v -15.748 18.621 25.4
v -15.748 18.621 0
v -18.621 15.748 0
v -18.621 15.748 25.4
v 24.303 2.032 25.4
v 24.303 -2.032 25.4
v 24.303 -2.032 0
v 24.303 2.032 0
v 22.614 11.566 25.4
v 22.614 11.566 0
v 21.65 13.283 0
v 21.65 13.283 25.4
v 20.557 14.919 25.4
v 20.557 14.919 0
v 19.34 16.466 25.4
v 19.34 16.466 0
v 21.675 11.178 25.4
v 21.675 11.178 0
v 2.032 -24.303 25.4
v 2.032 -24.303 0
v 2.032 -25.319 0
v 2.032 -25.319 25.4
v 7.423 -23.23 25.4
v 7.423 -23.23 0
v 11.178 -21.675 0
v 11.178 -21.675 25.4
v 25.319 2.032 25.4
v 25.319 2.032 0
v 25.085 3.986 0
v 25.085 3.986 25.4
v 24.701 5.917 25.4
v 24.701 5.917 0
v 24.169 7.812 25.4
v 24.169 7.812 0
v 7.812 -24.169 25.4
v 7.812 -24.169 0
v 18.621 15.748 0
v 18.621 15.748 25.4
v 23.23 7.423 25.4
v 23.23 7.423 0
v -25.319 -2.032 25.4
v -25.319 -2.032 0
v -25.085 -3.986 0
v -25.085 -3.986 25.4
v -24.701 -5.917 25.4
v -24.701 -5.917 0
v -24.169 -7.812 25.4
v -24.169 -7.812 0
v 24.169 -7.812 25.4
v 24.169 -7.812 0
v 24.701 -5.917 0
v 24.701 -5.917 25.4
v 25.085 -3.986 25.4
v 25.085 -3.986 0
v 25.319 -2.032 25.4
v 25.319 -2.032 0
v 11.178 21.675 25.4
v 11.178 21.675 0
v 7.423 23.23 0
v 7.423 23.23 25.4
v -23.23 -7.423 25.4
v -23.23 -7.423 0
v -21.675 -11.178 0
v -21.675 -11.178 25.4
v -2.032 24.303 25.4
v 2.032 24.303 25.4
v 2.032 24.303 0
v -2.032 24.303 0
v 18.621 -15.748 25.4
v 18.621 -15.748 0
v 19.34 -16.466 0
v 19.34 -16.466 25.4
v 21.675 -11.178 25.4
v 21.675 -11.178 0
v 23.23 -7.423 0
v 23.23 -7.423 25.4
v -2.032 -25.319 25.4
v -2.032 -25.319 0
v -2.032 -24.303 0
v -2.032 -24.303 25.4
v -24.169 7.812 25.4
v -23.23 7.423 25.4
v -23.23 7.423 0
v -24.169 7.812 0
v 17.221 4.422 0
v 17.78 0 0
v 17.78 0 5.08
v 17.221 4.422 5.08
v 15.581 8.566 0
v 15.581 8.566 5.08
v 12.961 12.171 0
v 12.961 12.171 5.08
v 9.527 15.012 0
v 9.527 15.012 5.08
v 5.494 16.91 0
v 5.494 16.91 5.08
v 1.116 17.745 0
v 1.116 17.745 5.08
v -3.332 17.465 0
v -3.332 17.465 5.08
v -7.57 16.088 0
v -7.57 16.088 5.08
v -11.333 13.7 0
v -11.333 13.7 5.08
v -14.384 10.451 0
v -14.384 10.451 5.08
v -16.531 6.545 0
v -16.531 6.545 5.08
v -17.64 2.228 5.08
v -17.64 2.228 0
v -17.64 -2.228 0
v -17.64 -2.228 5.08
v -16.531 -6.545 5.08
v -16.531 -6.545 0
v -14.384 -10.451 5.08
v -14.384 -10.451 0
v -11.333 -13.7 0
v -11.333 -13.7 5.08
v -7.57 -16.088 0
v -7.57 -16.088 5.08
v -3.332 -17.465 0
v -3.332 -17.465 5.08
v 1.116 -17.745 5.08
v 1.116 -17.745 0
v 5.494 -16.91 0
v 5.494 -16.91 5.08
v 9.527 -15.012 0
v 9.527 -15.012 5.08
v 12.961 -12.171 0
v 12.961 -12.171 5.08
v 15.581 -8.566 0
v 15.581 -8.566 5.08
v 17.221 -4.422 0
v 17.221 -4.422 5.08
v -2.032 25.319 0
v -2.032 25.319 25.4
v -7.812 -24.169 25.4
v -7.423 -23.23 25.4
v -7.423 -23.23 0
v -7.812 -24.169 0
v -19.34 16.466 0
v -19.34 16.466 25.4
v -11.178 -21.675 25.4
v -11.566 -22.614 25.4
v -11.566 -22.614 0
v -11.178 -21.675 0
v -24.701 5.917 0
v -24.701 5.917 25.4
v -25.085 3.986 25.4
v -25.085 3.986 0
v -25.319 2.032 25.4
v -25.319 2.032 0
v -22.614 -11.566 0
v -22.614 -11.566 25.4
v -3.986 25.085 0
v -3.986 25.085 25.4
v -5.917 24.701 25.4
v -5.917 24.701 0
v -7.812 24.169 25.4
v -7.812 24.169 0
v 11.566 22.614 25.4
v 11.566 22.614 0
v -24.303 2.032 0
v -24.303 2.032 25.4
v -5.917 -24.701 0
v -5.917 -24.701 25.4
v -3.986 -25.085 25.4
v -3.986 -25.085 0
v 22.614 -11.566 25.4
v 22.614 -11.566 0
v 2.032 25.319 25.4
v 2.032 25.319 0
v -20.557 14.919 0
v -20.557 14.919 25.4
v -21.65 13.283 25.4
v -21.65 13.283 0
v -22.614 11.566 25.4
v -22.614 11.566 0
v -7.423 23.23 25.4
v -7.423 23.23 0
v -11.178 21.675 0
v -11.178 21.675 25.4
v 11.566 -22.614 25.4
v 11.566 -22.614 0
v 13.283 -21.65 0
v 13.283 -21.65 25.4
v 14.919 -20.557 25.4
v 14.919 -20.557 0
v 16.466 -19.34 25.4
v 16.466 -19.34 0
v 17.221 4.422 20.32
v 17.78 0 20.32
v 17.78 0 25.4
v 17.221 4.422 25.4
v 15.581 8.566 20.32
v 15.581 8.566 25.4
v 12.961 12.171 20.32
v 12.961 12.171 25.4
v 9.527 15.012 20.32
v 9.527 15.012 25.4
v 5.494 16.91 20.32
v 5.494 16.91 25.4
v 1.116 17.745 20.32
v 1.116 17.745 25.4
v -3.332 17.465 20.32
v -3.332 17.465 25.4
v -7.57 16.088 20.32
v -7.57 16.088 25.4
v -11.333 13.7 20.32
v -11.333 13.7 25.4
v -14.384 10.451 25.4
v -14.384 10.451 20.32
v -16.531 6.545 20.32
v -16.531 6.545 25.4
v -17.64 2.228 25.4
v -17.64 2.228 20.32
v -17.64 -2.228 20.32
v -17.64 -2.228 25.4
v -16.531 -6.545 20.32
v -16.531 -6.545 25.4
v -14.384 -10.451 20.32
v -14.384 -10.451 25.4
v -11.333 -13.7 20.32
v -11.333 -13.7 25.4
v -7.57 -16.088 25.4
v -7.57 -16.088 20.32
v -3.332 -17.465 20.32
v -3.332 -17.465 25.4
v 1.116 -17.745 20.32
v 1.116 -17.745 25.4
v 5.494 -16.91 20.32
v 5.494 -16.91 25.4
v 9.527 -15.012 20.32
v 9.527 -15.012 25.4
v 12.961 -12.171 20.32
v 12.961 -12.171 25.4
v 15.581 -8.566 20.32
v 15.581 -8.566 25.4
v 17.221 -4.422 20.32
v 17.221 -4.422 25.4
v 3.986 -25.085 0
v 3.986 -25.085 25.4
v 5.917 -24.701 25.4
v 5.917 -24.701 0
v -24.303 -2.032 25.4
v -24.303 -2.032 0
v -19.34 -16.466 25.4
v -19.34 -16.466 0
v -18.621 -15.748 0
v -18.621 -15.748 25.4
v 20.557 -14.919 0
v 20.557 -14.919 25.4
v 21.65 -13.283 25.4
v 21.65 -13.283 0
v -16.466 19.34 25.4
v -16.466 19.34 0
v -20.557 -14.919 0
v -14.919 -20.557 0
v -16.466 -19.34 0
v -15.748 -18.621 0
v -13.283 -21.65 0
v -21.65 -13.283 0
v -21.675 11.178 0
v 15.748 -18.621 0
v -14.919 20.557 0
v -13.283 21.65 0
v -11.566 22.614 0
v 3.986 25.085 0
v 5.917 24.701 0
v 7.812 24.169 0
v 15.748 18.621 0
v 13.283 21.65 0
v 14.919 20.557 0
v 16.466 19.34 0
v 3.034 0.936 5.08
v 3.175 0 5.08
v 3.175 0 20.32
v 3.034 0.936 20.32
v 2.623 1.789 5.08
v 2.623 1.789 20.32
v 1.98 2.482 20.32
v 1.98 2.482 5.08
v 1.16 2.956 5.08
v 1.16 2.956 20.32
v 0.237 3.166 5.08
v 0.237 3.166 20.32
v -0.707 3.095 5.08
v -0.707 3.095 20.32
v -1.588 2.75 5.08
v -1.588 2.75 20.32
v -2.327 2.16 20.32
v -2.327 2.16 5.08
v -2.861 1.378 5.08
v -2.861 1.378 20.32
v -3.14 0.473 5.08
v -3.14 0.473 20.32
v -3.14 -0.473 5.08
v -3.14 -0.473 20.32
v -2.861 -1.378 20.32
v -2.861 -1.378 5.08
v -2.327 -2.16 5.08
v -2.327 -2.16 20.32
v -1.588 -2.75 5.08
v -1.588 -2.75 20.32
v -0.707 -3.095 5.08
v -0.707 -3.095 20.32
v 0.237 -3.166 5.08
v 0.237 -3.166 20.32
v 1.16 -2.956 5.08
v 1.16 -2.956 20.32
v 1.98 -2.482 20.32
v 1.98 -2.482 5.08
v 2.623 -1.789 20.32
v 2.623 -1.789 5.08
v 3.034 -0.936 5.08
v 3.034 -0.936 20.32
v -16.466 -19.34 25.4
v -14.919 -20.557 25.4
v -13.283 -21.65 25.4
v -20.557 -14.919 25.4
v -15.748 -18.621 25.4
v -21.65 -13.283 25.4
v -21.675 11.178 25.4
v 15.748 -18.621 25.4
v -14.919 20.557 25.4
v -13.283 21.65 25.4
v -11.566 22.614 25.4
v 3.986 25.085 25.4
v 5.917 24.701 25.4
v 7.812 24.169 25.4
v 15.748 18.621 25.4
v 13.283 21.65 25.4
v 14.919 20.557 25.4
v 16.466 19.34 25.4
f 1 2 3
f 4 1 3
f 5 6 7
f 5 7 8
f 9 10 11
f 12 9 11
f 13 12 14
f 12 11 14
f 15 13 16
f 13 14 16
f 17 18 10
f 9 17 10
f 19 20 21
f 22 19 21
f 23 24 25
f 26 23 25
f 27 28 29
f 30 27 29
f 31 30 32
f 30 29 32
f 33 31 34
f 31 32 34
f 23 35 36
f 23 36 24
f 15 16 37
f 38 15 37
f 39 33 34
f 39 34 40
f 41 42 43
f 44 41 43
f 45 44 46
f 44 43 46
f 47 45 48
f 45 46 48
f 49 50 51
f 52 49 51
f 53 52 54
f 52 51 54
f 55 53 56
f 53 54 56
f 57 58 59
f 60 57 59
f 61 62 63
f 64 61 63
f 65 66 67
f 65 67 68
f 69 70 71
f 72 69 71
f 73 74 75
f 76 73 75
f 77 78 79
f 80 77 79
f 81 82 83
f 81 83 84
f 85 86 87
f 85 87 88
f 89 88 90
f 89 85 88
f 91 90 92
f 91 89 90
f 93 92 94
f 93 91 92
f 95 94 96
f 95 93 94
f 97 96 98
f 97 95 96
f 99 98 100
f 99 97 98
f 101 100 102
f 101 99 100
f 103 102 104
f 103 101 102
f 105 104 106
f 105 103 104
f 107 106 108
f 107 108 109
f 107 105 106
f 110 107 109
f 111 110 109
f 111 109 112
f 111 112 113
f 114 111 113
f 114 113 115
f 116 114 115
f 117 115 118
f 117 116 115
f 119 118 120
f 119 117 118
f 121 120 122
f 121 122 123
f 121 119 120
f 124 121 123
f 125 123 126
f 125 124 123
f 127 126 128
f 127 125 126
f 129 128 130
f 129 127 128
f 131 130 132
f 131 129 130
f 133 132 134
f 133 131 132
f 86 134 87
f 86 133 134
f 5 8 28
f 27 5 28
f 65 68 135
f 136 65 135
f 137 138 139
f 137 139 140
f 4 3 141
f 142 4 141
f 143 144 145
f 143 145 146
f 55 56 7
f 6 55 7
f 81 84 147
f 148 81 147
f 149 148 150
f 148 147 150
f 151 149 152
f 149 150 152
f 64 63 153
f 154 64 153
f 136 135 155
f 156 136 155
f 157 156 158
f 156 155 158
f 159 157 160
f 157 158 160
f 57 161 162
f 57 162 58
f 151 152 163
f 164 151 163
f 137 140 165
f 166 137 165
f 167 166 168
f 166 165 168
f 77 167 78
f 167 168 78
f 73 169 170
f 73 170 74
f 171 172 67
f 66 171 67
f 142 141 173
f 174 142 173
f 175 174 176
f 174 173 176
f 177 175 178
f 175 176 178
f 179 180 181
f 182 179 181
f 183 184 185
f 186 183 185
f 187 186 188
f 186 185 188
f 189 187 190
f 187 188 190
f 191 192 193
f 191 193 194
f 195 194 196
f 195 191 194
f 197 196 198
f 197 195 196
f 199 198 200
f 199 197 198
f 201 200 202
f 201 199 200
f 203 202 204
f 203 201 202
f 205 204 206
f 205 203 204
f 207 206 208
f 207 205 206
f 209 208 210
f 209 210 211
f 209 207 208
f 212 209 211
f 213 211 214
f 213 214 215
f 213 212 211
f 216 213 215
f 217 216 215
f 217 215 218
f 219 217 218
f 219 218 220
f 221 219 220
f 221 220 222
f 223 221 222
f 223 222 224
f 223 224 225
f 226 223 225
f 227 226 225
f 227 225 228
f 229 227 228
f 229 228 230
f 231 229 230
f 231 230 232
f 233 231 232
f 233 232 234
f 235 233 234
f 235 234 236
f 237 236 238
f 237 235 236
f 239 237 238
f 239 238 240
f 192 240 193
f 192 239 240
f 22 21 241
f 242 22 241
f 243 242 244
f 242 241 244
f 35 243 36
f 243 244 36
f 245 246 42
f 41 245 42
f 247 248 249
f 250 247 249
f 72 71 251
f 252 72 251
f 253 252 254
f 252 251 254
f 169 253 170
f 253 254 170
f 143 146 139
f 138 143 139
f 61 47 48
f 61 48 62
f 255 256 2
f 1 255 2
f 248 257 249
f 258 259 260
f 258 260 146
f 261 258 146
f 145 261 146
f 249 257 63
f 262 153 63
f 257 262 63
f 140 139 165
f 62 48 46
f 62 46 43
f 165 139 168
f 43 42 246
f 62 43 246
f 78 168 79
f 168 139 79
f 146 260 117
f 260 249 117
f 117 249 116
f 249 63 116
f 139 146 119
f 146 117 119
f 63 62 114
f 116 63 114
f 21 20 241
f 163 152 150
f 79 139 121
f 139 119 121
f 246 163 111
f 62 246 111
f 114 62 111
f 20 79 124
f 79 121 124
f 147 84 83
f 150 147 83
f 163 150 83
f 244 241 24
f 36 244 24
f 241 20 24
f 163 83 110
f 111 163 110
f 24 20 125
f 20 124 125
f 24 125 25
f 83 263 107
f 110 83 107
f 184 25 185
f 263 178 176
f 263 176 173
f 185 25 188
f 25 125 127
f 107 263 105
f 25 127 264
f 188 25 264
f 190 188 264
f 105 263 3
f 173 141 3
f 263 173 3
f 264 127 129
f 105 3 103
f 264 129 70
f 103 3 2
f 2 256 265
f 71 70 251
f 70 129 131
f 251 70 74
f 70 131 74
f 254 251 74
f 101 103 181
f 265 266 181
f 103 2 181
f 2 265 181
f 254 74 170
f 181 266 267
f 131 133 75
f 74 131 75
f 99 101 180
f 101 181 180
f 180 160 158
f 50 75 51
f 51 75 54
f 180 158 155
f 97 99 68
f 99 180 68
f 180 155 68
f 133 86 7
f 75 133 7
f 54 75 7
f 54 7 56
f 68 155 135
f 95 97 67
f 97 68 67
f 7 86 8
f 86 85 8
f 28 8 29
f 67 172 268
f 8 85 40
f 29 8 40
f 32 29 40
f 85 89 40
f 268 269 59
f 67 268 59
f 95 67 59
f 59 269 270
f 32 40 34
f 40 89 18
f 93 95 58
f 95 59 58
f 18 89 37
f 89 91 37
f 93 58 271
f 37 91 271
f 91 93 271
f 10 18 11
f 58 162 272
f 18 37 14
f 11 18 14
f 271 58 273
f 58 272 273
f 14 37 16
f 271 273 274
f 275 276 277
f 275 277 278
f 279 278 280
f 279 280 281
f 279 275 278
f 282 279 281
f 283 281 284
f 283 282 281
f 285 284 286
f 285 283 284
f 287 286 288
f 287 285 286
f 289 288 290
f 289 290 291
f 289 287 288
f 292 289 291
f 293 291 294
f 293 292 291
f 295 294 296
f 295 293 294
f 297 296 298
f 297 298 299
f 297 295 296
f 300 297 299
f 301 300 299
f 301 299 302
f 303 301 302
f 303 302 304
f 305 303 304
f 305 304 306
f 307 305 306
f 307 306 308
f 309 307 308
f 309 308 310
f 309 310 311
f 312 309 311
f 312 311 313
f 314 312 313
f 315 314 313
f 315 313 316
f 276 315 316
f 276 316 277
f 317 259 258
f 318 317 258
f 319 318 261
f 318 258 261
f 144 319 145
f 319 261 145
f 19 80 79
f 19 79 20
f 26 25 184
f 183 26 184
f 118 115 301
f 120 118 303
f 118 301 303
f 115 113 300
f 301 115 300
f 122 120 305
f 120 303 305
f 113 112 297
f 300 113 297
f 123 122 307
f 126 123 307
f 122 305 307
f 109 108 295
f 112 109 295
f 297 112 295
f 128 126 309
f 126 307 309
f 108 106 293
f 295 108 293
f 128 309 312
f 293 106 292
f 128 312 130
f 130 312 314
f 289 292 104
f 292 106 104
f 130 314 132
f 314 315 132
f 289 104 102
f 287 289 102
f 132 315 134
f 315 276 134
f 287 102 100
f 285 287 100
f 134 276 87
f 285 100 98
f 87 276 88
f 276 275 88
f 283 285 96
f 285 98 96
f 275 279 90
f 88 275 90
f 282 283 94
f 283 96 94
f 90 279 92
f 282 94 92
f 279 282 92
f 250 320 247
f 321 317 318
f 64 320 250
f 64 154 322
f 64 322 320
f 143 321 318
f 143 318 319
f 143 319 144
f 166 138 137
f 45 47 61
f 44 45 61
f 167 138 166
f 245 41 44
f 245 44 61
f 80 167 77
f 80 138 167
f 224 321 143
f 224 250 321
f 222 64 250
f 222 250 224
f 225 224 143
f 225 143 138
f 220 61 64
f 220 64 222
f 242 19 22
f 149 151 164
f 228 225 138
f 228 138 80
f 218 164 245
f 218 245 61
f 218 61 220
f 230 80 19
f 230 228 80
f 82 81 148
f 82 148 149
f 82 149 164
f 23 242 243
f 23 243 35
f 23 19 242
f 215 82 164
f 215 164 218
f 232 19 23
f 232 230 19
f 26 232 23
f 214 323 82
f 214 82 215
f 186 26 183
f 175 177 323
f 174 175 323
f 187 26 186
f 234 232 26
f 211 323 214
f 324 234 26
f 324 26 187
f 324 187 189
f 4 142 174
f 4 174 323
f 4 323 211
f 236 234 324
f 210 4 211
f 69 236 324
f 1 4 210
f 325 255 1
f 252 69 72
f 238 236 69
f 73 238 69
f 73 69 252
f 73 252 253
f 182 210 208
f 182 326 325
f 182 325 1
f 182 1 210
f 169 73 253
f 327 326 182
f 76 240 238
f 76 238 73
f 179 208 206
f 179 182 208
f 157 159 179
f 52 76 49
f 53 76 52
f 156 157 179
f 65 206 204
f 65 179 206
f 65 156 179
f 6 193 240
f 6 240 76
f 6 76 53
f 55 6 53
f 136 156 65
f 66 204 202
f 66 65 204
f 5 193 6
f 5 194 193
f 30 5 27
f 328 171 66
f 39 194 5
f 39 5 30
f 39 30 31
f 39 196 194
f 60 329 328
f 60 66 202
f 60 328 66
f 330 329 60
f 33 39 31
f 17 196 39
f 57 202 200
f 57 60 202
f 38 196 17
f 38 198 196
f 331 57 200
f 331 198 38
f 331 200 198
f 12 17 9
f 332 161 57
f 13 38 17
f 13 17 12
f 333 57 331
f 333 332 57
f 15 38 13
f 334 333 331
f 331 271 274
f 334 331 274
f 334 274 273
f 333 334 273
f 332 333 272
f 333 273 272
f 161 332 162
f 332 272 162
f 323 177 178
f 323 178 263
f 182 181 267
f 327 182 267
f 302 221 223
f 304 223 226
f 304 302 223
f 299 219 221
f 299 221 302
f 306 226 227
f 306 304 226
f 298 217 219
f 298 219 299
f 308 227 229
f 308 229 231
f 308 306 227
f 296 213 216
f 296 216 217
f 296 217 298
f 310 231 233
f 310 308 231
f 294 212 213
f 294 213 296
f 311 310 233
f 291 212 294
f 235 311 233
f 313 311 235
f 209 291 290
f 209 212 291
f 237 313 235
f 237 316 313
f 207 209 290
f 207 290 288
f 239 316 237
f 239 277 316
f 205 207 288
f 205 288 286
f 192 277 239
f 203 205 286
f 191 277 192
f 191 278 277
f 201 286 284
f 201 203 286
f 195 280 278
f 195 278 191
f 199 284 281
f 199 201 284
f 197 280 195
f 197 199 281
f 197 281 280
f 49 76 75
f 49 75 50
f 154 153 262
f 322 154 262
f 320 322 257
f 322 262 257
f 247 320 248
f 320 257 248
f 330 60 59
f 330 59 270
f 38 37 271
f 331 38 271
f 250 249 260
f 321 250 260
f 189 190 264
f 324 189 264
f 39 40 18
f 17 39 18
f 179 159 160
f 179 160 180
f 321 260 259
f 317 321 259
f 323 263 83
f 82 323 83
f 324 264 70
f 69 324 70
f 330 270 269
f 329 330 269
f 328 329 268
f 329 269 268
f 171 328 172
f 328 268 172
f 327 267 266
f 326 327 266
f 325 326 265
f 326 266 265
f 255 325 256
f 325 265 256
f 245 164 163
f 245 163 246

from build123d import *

# Parameters (mm, degrees)
SKETCH1_R           = 17.78
BOSS_EXTRUDE2_DEPTH = 25.4
SKETCH1_3_R         = 17.78
SKETCH1_3_R_2       = 3.175
BOSS_EXTRUDE3_DEPTH = 20.32
SKETCH1_4_R         = 17.78
SKETCH1_4_R_2       = 3.175
CUT_EXTRUDE1_DEPTH  = 5.08


with BuildPart() as part:
    # Sketch1 → Boss-Extrude2 (new body)
    with BuildSketch(Plane.XY):
        with BuildLine():
            Line((11.566327956, 22.613713928), (11.177521588, 21.675052323))
            Line((11.177521588, 21.675052323), (7.422875168, 23.230277792))
            Line((7.422875168, 23.230277792), (7.811681536, 24.168939397))
            ThreePointArc((7.811681536, 24.168939397), (4.955294179, 24.911946122), (2.032, 25.318589534))
            Line((2.032, 25.318589534), (2.032, 24.302589534))
            Line((2.032, 24.302589534), (-2.032, 24.302589534))
            Line((-2.032, 24.302589534), (-2.032, 25.318589534))
            ThreePointArc((-2.032, 25.318589534), (-4.955294179, 24.911946122), (-7.811681536, 24.168939397))
            Line((-7.811681536, 24.168939397), (-7.422875168, 23.230277792))
            Line((-7.422875168, 23.230277792), (-11.177521588, 21.675052323))
            Line((-11.177521588, 21.675052323), (-11.566327956, 22.613713928))
            ThreePointArc((-11.566327956, 22.613713928), (-14.111483919, 21.119328152), (-16.46610537, 19.339787329))
            Line((-16.46610537, 19.339787329), (-15.747684881, 18.621366839))
            Line((-15.747684881, 18.621366839), (-18.621366839, 15.747684881))
            Line((-18.621366839, 15.747684881), (-19.339787329, 16.46610537))
            ThreePointArc((-19.339787329, 16.46610537), (-21.119328152, 14.111483919), (-22.613713928, 11.566327956))
            Line((-22.613713928, 11.566327956), (-21.675052323, 11.177521588))
            Line((-21.675052323, 11.177521588), (-23.230277792, 7.422875168))
            Line((-23.230277792, 7.422875168), (-24.168939397, 7.811681536))
            ThreePointArc((-24.168939397, 7.811681536), (-24.911946122, 4.955294179), (-25.318589534, 2.032))
            Line((-25.318589534, 2.032), (-24.302589534, 2.032))
            Line((-24.302589534, 2.032), (-24.302589534, -2.032))
            Line((-24.302589534, -2.032), (-25.318589534, -2.032))
            ThreePointArc((-25.318589534, -2.032), (-24.911946122, -4.955294179), (-24.168939397, -7.811681536))
            Line((-24.168939397, -7.811681536), (-23.230277792, -7.422875168))
            Line((-23.230277792, -7.422875168), (-21.675052323, -11.177521588))
            Line((-21.675052323, -11.177521588), (-22.613713928, -11.566327956))
            ThreePointArc((-22.613713928, -11.566327956), (-21.119328152, -14.111483919), (-19.339787329, -16.46610537))
            Line((-19.339787329, -16.46610537), (-18.621366839, -15.747684881))
            Line((-18.621366839, -15.747684881), (-15.747684881, -18.621366839))
            Line((-15.747684881, -18.621366839), (-16.46610537, -19.339787329))
            ThreePointArc((-16.46610537, -19.339787329), (-14.111483919, -21.119328152), (-11.566327956, -22.613713928))
            Line((-11.566327956, -22.613713928), (-11.177521588, -21.675052323))
            Line((-11.177521588, -21.675052323), (-7.422875168, -23.230277792))
            Line((-7.422875168, -23.230277792), (-7.811681536, -24.168939397))
            ThreePointArc((-7.811681536, -24.168939397), (-4.955294179, -24.911946122), (-2.032, -25.318589534))
            Line((-2.032, -25.318589534), (-2.032, -24.302589534))
            Line((-2.032, -24.302589534), (2.032, -24.302589534))
            Line((2.032, -24.302589534), (2.032, -25.318589534))
            ThreePointArc((2.032, -25.318589534), (4.955294179, -24.911946122), (7.811681536, -24.168939397))
            Line((7.811681536, -24.168939397), (7.422875168, -23.230277792))
            Line((7.422875168, -23.230277792), (11.177521588, -21.675052323))
            Line((11.177521588, -21.675052323), (11.566327956, -22.613713928))
            ThreePointArc((11.566327956, -22.613713928), (14.111483919, -21.119328152), (16.46610537, -19.339787329))
            Line((16.46610537, -19.339787329), (15.747684881, -18.621366839))
            Line((15.747684881, -18.621366839), (18.621366839, -15.747684881))
            Line((18.621366839, -15.747684881), (19.339787329, -16.46610537))
            ThreePointArc((19.339787329, -16.46610537), (21.119328152, -14.111483919), (22.613713928, -11.566327956))
            Line((22.613713928, -11.566327956), (21.675052323, -11.177521588))
            Line((21.675052323, -11.177521588), (23.230277792, -7.422875168))
            Line((23.230277792, -7.422875168), (24.168939397, -7.811681536))
            ThreePointArc((24.168939397, -7.811681536), (24.911946122, -4.955294179), (25.318589534, -2.032))
            Line((25.318589534, -2.032), (24.302589534, -2.032))
            Line((24.302589534, -2.032), (24.302589534, 2.032))
            Line((24.302589534, 2.032), (25.318589534, 2.032))
            ThreePointArc((25.318589534, 2.032), (24.911946122, 4.955294179), (24.168939397, 7.811681536))
            Line((24.168939397, 7.811681536), (23.230277792, 7.422875168))
            Line((23.230277792, 7.422875168), (21.675052323, 11.177521588))
            Line((21.675052323, 11.177521588), (22.613713928, 11.566327956))
            ThreePointArc((22.613713928, 11.566327956), (21.119328152, 14.111483919), (19.339787329, 16.46610537))
            Line((19.339787329, 16.46610537), (18.621366839, 15.747684881))
            Line((18.621366839, 15.747684881), (15.747684881, 18.621366839))
            Line((15.747684881, 18.621366839), (16.46610537, 19.339787329))
            ThreePointArc((16.46610537, 19.339787329), (14.111483919, 21.119328152), (11.566327956, 22.613713928))
        make_face()
        Circle(SKETCH1_R, mode=Mode.SUBTRACT)
    extrude(amount=BOSS_EXTRUDE2_DEPTH)

    # Sketch1<3> → Boss-Extrude3 (add)
    with BuildSketch(Plane.XY):
        Circle(SKETCH1_3_R)
        Circle(SKETCH1_3_R_2, mode=Mode.SUBTRACT)
    extrude(amount=BOSS_EXTRUDE3_DEPTH)

    # Sketch1<4> → Cut-Extrude1 (cut)
    with BuildSketch(Plane.XY):
        Circle(SKETCH1_4_R)
        Circle(SKETCH1_4_R_2, mode=Mode.SUBTRACT)
    extrude(amount=CUT_EXTRUDE1_DEPTH, mode=Mode.SUBTRACT)


solid = part.part
